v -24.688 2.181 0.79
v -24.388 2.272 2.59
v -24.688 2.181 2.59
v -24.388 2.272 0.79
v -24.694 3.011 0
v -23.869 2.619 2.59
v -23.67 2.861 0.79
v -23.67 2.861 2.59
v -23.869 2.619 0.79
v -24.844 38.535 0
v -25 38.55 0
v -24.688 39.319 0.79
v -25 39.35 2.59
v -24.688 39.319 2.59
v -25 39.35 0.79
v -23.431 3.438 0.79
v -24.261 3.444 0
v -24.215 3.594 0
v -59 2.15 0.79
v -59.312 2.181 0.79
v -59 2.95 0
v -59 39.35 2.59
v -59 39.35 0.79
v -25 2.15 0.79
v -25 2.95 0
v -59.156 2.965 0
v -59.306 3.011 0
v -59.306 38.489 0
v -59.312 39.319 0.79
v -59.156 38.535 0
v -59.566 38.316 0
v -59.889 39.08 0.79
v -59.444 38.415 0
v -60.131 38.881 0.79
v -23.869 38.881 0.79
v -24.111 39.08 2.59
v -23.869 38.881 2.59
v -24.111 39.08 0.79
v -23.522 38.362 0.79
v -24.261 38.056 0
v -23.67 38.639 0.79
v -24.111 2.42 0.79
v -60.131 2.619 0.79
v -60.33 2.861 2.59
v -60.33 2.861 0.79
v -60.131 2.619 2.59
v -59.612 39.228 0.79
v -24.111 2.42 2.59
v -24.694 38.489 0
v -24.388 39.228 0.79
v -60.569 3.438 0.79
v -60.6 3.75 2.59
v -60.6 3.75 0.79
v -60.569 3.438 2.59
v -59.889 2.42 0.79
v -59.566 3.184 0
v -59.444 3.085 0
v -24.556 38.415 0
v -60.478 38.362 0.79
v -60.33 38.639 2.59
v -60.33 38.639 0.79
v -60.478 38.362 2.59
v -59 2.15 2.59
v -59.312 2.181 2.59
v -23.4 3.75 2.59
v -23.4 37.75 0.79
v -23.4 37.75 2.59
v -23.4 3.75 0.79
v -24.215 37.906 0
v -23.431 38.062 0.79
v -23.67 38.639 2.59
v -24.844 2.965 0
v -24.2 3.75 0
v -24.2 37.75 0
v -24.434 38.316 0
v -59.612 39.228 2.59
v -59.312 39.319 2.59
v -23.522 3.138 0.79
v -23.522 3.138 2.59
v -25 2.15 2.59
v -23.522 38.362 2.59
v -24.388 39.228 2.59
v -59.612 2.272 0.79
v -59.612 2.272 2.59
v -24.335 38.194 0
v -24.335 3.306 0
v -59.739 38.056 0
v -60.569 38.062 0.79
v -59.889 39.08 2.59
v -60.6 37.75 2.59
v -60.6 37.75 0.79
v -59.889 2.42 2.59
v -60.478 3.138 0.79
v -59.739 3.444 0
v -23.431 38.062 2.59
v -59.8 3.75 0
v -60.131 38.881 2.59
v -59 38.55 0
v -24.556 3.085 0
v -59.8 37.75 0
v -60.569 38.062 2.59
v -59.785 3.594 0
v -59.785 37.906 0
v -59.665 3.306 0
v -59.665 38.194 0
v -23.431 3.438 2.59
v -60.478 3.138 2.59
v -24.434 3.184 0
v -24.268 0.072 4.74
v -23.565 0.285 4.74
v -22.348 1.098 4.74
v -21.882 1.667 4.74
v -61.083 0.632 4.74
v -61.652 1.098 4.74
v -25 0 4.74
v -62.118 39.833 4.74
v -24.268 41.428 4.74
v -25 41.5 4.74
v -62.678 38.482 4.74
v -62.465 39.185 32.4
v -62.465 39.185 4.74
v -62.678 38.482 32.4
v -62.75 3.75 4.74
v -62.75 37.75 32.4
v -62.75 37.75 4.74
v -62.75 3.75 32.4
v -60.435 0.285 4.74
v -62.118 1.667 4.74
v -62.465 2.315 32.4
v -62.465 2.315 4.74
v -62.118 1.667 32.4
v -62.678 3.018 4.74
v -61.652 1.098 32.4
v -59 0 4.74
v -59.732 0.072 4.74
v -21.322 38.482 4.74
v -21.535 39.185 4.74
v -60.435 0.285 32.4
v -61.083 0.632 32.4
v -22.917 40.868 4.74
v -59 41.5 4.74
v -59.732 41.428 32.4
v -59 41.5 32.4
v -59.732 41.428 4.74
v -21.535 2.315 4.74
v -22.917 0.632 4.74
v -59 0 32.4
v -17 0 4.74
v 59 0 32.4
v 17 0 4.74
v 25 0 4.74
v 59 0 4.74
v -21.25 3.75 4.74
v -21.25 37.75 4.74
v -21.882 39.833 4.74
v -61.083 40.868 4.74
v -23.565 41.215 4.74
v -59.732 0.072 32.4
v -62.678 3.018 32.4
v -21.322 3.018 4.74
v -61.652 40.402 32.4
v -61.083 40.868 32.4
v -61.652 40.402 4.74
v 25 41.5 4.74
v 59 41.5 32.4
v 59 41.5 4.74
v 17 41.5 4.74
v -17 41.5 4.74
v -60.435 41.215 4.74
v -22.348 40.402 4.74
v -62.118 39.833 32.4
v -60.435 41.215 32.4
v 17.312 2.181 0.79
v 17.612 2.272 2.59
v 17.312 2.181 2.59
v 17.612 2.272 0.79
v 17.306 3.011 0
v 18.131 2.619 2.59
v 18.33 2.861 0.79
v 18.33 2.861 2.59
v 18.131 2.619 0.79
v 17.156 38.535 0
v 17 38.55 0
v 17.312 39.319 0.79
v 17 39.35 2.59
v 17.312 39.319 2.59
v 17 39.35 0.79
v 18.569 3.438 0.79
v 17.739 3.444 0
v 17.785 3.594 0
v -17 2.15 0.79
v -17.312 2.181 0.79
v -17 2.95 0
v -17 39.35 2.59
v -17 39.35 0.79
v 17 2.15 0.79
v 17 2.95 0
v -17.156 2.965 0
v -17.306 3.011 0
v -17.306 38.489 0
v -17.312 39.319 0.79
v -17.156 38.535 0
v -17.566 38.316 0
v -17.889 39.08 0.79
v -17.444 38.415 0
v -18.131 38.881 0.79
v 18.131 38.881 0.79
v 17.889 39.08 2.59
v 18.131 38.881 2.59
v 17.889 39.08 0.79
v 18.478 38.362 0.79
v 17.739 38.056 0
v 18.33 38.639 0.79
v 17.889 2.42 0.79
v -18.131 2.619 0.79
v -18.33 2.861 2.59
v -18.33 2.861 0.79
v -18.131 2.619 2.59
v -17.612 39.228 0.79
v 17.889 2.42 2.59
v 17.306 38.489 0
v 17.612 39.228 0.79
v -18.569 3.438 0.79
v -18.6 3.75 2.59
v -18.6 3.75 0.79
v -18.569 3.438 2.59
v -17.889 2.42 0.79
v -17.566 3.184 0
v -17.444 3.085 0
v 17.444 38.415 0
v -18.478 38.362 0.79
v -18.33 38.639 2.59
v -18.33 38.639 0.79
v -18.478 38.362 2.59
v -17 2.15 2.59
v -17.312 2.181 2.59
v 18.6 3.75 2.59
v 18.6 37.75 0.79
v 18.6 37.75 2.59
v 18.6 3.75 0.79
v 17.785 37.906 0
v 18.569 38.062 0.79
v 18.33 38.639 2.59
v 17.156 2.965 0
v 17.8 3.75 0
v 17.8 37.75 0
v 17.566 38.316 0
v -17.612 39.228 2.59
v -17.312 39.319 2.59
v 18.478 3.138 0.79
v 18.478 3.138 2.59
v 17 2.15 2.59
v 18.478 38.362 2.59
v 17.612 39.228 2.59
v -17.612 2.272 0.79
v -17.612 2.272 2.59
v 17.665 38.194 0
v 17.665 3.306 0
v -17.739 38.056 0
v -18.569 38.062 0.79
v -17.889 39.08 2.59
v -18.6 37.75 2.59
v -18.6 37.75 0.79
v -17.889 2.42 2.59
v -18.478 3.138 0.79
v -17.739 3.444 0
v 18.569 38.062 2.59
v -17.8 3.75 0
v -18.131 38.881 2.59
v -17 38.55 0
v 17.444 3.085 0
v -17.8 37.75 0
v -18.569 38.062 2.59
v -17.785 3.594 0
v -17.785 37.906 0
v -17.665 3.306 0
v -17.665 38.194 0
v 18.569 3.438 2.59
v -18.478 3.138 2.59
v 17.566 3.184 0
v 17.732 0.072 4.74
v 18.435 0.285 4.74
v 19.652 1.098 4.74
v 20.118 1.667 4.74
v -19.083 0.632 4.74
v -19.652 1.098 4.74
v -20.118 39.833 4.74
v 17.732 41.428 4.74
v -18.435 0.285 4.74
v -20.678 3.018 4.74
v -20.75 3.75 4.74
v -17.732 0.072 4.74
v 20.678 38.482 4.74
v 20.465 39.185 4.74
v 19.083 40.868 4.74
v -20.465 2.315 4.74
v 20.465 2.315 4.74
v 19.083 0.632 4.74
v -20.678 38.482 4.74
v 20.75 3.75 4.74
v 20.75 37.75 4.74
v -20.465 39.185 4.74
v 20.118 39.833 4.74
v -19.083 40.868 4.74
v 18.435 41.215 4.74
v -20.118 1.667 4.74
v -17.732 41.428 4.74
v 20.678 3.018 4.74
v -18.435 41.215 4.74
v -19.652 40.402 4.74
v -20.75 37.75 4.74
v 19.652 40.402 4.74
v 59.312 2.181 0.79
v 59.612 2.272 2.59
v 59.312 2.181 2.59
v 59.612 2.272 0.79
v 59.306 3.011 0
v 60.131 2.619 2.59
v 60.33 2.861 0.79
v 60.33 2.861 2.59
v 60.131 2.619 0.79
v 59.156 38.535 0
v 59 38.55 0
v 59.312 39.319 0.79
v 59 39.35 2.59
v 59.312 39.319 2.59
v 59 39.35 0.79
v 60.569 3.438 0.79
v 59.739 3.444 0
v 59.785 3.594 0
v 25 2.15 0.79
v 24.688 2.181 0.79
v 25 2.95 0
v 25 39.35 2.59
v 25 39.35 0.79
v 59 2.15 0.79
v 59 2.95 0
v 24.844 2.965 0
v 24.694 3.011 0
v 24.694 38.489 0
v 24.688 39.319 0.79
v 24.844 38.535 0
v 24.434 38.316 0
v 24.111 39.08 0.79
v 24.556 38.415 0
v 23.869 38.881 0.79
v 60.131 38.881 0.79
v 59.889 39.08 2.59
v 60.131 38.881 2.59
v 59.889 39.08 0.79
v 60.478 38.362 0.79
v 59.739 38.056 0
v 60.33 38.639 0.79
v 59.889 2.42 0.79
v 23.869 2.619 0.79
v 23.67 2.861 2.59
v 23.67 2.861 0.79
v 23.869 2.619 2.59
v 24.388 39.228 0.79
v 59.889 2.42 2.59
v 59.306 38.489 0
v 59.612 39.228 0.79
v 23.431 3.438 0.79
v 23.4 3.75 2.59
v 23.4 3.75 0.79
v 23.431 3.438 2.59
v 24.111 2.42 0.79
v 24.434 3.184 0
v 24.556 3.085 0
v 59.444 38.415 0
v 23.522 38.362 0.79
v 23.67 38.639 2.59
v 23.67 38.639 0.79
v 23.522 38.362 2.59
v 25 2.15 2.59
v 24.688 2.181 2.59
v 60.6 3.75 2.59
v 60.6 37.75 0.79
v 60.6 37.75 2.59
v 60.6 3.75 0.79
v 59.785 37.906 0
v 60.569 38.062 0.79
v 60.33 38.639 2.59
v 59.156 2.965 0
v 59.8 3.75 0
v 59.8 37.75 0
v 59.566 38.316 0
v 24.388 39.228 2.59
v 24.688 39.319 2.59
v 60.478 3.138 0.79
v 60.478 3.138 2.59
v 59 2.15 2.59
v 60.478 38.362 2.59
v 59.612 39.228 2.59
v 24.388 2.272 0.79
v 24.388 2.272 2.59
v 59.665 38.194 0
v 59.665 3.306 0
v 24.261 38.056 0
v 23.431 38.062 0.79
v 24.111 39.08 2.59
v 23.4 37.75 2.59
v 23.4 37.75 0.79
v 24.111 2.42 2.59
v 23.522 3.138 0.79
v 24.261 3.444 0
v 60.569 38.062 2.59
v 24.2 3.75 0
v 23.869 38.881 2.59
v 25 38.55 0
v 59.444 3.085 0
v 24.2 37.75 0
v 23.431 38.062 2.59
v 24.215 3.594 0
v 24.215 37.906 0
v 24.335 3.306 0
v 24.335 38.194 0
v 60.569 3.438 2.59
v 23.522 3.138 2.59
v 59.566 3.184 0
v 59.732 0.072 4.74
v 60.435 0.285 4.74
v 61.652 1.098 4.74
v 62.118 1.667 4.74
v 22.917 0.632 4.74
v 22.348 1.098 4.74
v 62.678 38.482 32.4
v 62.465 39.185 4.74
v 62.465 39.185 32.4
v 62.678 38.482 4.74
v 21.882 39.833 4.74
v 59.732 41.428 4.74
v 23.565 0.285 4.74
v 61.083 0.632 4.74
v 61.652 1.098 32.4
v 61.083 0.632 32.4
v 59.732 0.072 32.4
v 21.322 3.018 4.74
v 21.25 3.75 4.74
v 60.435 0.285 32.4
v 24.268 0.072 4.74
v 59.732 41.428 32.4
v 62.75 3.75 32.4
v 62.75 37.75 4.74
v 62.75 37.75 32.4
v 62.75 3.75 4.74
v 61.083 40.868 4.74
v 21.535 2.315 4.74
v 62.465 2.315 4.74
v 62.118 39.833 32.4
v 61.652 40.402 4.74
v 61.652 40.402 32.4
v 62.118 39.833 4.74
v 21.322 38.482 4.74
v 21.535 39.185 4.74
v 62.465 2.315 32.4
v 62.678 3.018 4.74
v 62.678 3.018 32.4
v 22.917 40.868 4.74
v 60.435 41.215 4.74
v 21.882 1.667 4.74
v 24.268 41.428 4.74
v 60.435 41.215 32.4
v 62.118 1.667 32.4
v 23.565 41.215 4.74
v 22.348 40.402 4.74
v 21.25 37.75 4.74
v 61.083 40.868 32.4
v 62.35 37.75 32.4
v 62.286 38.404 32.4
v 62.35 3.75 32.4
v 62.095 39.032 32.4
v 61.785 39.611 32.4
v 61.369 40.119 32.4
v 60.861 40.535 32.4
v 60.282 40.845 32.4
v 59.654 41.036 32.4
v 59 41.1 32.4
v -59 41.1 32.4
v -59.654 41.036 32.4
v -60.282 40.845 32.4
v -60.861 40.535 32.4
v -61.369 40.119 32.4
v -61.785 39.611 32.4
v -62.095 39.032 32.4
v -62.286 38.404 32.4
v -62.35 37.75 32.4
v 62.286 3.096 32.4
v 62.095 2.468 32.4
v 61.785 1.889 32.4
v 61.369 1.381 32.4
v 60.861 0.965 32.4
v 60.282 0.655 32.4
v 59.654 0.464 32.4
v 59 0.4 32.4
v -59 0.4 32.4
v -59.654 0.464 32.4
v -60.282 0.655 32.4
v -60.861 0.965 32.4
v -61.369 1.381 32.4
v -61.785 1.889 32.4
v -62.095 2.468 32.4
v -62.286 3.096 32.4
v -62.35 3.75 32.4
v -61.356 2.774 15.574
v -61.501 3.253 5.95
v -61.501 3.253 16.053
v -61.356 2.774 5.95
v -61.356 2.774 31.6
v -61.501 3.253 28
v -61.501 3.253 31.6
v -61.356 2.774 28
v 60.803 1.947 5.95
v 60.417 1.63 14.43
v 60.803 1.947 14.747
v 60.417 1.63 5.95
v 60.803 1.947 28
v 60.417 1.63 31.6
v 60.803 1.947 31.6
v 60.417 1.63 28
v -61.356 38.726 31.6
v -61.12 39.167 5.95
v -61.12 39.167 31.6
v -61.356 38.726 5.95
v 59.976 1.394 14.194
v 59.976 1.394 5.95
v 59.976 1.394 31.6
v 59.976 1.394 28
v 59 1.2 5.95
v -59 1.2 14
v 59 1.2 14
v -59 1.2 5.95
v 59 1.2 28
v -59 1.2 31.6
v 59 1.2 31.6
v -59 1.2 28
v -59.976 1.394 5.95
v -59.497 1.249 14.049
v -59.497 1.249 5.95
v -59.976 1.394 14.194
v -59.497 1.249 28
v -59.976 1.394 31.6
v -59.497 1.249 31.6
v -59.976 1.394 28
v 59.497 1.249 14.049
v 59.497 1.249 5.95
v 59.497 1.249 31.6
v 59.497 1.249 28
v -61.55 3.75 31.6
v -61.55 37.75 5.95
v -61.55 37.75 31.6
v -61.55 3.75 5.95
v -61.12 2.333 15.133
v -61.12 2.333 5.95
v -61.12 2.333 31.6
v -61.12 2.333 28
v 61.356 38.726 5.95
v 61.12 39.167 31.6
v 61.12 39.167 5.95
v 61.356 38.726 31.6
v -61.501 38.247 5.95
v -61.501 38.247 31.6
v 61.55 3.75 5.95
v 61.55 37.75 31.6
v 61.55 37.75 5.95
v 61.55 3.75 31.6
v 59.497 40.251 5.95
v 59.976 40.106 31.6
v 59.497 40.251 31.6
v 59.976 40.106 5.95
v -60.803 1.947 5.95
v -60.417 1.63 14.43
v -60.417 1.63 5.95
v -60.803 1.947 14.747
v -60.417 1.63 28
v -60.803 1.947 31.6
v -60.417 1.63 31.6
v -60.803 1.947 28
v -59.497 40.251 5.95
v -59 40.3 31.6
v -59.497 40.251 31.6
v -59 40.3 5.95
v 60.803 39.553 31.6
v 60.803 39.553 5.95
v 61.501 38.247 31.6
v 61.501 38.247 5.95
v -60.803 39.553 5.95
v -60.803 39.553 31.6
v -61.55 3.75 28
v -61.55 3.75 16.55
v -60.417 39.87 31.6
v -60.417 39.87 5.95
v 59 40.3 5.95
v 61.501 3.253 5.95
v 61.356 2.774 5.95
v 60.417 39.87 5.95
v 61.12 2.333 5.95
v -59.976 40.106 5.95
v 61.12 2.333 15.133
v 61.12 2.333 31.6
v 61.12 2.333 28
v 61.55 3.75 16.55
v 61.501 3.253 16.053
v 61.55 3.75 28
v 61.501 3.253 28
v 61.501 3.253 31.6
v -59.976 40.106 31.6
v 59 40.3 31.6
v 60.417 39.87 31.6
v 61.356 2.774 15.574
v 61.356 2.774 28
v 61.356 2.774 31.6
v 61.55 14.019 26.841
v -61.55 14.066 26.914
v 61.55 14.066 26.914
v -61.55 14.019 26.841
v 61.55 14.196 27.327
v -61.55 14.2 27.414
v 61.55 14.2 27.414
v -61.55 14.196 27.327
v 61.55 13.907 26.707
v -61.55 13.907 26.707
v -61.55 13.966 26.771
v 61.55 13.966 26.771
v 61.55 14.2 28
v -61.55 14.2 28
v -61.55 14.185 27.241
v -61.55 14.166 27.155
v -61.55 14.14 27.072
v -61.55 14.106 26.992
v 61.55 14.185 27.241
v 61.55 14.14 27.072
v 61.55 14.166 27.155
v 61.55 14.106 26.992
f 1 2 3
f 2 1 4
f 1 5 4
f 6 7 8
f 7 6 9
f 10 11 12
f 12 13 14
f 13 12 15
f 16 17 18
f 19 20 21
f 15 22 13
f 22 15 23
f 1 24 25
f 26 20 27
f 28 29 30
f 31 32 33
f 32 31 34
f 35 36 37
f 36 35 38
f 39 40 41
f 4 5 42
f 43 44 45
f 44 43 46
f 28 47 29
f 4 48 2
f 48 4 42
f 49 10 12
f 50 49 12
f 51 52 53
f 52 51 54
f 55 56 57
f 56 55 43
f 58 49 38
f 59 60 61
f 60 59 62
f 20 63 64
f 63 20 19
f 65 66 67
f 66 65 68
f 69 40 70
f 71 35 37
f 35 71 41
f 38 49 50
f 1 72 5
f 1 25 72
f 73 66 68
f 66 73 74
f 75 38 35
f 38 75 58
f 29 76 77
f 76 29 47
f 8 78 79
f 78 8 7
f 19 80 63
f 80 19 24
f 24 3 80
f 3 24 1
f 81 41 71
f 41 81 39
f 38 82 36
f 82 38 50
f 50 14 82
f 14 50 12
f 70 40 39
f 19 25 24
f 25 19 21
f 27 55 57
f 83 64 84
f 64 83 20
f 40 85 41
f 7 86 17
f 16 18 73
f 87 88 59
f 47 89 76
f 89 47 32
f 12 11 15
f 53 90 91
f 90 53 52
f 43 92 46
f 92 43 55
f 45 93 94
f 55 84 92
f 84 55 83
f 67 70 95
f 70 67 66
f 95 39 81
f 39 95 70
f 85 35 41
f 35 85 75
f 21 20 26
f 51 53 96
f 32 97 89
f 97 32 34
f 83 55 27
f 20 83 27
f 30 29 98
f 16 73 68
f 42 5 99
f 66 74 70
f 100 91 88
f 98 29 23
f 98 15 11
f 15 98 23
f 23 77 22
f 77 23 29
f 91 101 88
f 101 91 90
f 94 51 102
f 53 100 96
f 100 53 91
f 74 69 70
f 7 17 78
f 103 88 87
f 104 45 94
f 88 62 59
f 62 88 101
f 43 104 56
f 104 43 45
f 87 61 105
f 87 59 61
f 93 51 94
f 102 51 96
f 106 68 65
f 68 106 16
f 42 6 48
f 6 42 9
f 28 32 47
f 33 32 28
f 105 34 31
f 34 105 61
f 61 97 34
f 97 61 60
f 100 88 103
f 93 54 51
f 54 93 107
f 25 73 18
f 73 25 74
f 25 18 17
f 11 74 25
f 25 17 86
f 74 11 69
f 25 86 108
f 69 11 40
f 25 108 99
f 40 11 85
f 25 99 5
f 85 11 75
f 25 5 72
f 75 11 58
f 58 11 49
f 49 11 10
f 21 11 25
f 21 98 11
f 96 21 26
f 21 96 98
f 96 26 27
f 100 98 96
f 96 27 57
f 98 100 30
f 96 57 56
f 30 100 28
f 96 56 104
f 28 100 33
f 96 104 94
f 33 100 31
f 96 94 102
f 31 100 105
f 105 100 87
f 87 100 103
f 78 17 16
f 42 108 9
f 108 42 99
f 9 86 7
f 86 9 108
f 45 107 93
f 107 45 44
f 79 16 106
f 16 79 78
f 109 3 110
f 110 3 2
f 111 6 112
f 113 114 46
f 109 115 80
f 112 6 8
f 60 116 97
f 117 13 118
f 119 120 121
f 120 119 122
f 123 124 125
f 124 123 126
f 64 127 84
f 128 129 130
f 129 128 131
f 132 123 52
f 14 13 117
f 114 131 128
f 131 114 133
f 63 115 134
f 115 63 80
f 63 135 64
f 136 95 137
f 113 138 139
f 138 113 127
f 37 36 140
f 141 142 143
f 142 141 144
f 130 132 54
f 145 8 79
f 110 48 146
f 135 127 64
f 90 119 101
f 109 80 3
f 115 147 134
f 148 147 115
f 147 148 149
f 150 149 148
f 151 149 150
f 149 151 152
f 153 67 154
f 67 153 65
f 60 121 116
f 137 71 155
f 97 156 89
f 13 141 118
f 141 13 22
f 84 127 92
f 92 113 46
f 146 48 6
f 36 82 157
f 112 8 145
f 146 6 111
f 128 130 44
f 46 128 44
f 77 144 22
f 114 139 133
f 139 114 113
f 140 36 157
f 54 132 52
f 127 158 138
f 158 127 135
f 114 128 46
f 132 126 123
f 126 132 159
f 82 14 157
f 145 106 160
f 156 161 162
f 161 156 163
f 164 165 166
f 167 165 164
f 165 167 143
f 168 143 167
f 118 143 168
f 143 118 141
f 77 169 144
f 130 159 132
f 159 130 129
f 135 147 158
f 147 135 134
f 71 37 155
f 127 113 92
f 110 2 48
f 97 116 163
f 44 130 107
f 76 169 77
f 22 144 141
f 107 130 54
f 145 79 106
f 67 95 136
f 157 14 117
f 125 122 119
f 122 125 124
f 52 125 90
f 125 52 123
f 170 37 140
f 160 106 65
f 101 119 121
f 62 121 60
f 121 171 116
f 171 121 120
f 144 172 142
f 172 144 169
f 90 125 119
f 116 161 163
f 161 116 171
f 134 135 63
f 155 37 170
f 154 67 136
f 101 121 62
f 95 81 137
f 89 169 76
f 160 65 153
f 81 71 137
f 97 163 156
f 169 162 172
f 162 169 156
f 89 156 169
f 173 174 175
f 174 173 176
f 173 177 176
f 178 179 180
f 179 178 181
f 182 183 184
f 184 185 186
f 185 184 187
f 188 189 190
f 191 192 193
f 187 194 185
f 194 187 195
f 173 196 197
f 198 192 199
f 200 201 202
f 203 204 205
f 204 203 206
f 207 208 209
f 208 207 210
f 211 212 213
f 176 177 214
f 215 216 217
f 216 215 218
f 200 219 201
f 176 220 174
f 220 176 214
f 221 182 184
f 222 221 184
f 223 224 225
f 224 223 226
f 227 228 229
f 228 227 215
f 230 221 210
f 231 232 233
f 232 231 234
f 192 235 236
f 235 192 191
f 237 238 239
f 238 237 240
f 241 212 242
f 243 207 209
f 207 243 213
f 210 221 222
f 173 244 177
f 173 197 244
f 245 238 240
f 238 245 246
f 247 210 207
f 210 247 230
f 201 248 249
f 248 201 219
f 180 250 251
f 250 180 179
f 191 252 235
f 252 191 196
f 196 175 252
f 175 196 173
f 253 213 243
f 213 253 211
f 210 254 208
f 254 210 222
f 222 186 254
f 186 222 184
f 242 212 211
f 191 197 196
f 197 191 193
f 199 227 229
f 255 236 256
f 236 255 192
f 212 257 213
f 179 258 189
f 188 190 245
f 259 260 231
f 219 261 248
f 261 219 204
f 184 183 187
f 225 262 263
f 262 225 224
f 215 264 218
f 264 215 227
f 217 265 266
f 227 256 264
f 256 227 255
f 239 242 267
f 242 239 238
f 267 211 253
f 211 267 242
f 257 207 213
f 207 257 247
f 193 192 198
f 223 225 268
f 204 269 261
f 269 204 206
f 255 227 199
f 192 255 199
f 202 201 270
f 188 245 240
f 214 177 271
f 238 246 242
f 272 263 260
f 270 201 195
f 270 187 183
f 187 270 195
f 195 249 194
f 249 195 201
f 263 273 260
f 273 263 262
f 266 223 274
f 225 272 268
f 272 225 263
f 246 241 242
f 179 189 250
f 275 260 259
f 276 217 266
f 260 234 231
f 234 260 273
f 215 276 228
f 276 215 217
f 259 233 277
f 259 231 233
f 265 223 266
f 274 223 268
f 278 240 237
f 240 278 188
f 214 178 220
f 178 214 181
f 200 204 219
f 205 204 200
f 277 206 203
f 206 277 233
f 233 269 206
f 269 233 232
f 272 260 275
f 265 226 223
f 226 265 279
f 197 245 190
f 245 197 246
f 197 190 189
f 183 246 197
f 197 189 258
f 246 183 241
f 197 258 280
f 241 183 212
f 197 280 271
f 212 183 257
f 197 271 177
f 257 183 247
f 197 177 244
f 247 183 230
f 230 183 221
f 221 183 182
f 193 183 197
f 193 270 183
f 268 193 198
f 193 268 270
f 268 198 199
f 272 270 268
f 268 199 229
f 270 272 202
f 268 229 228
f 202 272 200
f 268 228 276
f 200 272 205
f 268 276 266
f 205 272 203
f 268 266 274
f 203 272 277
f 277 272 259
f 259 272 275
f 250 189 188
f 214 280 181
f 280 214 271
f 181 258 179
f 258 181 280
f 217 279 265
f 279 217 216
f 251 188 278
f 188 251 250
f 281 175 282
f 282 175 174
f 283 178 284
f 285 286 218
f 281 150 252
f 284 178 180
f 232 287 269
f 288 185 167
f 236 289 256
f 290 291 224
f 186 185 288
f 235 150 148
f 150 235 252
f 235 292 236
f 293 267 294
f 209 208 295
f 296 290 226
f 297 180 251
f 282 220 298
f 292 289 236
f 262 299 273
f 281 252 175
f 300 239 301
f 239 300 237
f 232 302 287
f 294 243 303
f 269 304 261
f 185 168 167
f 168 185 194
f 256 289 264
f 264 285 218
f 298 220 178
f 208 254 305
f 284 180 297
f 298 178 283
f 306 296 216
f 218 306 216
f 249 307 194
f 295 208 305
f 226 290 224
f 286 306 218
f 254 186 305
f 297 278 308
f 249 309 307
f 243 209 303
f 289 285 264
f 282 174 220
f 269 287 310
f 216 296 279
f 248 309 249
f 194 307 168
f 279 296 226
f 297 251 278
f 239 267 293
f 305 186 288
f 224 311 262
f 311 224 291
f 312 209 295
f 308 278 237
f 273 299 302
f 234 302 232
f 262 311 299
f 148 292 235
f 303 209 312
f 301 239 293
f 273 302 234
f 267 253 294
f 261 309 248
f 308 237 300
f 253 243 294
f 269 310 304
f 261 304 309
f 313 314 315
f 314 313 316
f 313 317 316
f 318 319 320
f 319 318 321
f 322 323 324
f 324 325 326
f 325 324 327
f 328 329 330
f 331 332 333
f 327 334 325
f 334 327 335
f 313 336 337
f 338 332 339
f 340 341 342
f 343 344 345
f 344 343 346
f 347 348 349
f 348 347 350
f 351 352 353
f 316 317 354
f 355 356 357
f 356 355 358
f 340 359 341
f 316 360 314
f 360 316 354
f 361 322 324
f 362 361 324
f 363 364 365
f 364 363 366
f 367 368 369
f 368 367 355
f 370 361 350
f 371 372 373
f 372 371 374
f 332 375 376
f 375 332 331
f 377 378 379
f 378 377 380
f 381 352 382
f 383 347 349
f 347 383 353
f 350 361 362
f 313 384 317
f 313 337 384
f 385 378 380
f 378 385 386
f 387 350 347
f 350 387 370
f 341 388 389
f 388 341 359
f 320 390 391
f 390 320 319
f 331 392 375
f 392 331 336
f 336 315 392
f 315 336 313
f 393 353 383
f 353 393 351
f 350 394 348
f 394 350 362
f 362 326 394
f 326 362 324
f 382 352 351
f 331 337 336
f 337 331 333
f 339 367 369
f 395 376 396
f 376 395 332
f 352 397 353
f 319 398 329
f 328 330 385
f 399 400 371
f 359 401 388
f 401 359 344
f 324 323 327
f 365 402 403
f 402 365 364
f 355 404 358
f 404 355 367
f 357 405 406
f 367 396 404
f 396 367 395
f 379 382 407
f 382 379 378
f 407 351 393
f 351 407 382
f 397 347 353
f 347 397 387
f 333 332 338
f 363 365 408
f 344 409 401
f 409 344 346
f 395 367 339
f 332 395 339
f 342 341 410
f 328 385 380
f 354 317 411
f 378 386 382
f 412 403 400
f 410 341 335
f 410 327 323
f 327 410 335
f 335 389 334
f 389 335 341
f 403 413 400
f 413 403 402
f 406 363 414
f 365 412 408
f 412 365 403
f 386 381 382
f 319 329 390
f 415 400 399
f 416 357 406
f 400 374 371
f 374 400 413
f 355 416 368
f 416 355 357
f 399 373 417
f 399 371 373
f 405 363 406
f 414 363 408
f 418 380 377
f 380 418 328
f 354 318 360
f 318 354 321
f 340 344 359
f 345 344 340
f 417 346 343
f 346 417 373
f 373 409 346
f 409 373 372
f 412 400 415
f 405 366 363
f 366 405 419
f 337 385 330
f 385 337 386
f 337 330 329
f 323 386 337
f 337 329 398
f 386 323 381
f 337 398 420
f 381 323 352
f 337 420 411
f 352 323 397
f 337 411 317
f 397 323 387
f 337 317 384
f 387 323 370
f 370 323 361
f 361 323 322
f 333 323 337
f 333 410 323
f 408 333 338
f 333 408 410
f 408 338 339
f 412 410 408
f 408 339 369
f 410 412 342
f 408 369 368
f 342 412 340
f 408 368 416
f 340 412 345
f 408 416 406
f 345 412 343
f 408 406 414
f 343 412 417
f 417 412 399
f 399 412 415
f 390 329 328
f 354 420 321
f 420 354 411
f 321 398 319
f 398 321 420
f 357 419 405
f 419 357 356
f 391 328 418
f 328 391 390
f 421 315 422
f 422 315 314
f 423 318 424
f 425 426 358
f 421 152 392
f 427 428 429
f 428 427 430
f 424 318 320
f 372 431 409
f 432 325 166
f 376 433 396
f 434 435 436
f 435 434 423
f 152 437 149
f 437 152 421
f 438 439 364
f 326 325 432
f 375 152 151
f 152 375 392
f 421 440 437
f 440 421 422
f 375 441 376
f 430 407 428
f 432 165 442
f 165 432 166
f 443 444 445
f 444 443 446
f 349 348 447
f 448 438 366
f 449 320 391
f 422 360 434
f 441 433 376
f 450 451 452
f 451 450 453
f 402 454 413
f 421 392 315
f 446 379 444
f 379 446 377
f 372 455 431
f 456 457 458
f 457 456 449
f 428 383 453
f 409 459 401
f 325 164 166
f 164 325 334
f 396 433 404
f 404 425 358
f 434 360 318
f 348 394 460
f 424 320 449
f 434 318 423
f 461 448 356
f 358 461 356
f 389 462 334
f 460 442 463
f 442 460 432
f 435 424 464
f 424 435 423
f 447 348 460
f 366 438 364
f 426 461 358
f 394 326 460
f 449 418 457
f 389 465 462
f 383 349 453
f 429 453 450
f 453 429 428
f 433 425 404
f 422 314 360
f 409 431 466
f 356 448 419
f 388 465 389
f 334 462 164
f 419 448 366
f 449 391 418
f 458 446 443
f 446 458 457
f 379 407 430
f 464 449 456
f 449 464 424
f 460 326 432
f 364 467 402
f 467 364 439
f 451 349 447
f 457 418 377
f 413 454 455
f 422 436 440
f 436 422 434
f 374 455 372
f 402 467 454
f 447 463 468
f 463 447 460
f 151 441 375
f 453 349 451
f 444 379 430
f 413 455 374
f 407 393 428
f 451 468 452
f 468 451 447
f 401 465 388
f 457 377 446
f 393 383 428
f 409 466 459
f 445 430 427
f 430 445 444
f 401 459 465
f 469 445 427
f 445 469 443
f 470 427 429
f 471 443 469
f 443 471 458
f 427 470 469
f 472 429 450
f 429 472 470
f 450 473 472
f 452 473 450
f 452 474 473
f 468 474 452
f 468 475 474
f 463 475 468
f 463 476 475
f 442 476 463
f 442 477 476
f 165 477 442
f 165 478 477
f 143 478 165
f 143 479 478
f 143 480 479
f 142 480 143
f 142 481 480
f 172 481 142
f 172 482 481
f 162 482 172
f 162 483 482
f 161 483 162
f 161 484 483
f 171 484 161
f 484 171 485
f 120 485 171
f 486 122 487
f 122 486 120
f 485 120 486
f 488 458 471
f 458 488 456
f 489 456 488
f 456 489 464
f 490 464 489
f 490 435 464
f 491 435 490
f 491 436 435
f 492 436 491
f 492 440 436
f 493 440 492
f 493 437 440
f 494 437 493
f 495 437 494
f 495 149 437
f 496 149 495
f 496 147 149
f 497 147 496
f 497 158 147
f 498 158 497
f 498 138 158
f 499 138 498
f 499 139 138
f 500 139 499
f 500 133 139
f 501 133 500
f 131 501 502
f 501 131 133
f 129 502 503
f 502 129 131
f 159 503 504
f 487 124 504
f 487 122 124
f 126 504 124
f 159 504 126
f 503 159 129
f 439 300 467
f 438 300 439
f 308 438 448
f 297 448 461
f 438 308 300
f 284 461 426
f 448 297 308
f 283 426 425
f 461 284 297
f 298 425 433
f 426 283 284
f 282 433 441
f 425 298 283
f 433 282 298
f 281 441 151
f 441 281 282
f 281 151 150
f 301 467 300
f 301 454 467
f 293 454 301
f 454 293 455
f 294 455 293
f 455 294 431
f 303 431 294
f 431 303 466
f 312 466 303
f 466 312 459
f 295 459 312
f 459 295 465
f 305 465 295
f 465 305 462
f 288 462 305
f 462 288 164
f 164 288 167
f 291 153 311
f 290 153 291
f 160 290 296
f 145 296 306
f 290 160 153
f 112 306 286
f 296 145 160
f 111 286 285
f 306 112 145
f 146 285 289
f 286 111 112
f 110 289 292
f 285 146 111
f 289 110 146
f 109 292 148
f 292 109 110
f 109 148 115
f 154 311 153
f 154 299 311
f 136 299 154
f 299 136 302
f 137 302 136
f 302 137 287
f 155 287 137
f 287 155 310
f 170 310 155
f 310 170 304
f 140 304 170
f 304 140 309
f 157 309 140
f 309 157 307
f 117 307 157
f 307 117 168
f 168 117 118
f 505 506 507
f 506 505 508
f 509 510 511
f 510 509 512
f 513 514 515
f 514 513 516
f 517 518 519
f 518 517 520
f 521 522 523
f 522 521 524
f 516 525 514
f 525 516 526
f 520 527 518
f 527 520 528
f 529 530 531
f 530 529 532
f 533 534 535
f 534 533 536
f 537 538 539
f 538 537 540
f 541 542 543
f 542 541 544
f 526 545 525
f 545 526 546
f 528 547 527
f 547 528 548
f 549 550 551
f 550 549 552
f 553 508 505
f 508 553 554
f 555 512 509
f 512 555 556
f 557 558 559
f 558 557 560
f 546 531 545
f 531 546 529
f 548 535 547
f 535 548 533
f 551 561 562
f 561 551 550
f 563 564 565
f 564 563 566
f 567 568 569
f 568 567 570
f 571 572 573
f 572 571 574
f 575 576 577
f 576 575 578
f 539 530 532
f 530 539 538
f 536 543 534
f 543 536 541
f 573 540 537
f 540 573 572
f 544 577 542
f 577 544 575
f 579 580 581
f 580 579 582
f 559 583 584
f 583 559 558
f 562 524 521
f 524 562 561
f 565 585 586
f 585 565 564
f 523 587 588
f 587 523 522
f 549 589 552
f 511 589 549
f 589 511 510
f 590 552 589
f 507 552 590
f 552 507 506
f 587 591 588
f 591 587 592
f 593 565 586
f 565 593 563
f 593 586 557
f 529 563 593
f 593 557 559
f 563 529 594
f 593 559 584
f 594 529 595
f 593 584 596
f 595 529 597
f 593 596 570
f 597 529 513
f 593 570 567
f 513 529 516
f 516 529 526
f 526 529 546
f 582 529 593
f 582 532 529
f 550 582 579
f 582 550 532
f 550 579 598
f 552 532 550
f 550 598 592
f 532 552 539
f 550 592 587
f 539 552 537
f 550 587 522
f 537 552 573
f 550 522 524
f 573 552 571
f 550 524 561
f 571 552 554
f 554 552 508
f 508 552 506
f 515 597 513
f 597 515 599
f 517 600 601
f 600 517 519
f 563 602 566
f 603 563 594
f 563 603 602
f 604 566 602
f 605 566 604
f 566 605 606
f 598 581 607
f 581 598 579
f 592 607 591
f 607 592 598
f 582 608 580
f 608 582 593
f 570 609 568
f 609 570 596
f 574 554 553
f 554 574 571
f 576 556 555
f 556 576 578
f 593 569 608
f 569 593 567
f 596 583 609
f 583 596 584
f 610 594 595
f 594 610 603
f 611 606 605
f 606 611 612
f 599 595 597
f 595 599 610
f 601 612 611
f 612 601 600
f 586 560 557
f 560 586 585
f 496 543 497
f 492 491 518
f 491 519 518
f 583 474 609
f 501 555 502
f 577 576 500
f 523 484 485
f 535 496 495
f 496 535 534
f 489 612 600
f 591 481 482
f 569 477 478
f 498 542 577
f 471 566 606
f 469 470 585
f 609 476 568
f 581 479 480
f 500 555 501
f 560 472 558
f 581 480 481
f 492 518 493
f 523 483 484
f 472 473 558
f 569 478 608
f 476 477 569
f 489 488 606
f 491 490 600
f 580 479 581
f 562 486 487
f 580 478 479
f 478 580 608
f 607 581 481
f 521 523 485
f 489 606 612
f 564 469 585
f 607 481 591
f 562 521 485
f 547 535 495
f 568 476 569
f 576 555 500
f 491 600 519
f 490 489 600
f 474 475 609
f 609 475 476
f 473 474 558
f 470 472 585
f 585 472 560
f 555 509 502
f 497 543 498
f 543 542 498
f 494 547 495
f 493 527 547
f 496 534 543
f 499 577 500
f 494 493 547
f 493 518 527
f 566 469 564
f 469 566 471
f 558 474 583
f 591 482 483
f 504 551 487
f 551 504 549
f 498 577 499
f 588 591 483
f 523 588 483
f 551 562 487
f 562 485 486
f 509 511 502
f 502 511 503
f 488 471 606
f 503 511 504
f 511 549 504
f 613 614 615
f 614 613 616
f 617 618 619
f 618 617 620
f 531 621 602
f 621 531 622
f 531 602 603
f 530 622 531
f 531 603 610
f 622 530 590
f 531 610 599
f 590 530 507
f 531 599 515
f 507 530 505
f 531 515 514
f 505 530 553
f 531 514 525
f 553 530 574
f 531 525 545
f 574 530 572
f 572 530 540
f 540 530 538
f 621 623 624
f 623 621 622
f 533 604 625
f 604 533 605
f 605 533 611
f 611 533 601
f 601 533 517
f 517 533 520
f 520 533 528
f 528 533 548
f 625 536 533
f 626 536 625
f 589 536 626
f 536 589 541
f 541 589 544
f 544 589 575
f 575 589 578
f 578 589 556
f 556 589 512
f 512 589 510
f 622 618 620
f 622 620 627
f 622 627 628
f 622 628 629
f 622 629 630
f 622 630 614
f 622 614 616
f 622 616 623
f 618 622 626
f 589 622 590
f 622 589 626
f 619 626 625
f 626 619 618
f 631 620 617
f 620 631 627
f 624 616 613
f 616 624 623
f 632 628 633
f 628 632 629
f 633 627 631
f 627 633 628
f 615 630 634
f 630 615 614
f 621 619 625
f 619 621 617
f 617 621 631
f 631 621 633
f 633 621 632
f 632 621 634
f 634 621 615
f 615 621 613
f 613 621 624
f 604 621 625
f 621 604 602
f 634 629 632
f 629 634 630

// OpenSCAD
// file: ../../modules/gridfinity.scad
// Gridfinity ベースプレートの共有 module。
// 寸法は Gridfinity 仕様 (Zack Freedman) の baseplate 輪郭に従う:
//   ピッチ 42、ソケット上端開口 41.5 (角 R4)、上から 45° 面取り 2.15 →
//   垂直 1.8 (37.2 角・R1.85) → 45° 面取り 0.7 → 底 35.8 角 (R1.15)。
//   ソケット深さ = 2.15 + 1.8 + 0.7 = 4.65。
//
// 座標系: X が列方向 (中央が 0)、Y が行方向 (板の前端が 0)、Z=0 が板の底面。
// 板の外形は grid とは独立に rim で与えるので、grid より大きい板 (縁付き) を
// 作れる。ソケットは rim=[left, right, front, back] の内側へ 42 ピッチで並ぶ。

gf_pitch = 42;
gf_socket_top = 41.5; // 上端開口
gf_socket_mid = 37.2; // 垂直部
gf_socket_bot = 35.8; // 底
gf_socket_r_top = 4;
gf_socket_r_mid = 1.85;
gf_socket_r_bot = 1.15;
gf_chamfer_top = 2.15;
gf_wall_h = 1.8;
gf_chamfer_bot = 0.7;
gf_socket_depth = gf_chamfer_top + gf_wall_h + gf_chamfer_bot; // 4.65
gf_fn = 32;
gf_eps = 0.01; // hull 用の薄板の厚さ
gf_over = 0.5; // 切削の抜き代

// 角丸正方形 (一辺 w、角 R)
module
gf_rounded_square(w, r)
{
    offset(r = r, $fn = gf_fn) square(w - 2 * r, center = true);
}

// 厚さ gf_eps の角丸正方形の薄板を z に置く (hull の骨)
module
gf_slab(w, r, z)
{
    translate([ 0, 0, z ]) linear_extrude(gf_eps) gf_rounded_square(w, r);
}

// ソケット1個の切削体。z=0 がソケットの底 (床の天面)、+Z へ 4.65 で天面に出る。
// clearance は嵌合の逃げで、輪郭を全周へ clearance だけ外へ出す (幅 +2c、角 R
// +c)。 既定 0 が Gridfinity の公称輪郭。深さとピッチは変えない
module
gf_socket_cut(clearance = 0)
{
    z1 = gf_chamfer_bot;
    z2 = z1 + gf_wall_h;
    z3 = gf_socket_depth;
    c = clearance;
    hull()
    {
        gf_slab(gf_socket_bot + 2 * c, gf_socket_r_bot + c, 0);
        gf_slab(gf_socket_mid + 2 * c, gf_socket_r_mid + c, z1 - gf_eps);
    }
    hull()
    {
        gf_slab(gf_socket_mid + 2 * c, gf_socket_r_mid + c, z1 - gf_eps);
        gf_slab(gf_socket_mid + 2 * c, gf_socket_r_mid + c, z2 - gf_eps);
    }
    hull()
    {
        gf_slab(gf_socket_mid + 2 * c, gf_socket_r_mid + c, z2 - gf_eps);
        gf_slab(gf_socket_top + 2 * c, gf_socket_r_top + c, z3 - gf_eps);
    }
    // 天面より上へ抜く (天面と同一平面の退化した面を残さない)
    gf_slab(gf_socket_top + 2 * c, gf_socket_r_top + c, z3 - gf_eps);
    translate([ 0, 0, z3 - gf_eps ]) linear_extrude(gf_over + gf_eps)
        gf_rounded_square(gf_socket_top + 2 * c, gf_socket_r_top + c);
}

// ベースプレート。cols x rows のソケットを床 floor_t の上に彫る。
// rim = [left, right, front, back] はソケット列の外側に残す縁の幅。
// 板の幅 = cols*42 + left + right、奥行き = rows*42 + front + back。
// clearance はソケットの嵌合の逃げ (gf_socket_cut を参照)。
module
gf_baseplate(cols, rows, rim = [ 0, 0, 0, 0 ], floor_t = 1, clearance = 0)
{
    grid_w = cols * gf_pitch;
    grid_d = rows * gf_pitch;
    plate_w = grid_w + rim[0] + rim[1];
    plate_d = grid_d + rim[2] + rim[3];
    x0 = -plate_w / 2 + rim[0]; // ソケット列の左端
    difference()
    {
        translate([ -plate_w / 2, 0, 0 ])
            cube([ plate_w, plate_d, floor_t + gf_socket_depth ]);
        for (c = [0:cols - 1], r = [0:rows - 1])
            translate([
                x0 + (c + 0.5) * gf_pitch,
                rim[2] + (r + 0.5) * gf_pitch,
                floor_t
            ]) gf_socket_cut(clearance);
    }
}
// file: ../../modules/gridfinity_bin.scad
include <gridfinity.scad>

// Gridfinity bin (箱) の共有 module。ピッチと角丸は gridfinity.scad
// と共有する。 底の輪郭は Gridfinity 仕様の bin base (下から):
//   35.6 角 (R0.8) → 45° 0.8 → 37.2 角 (R1.6) → 垂直 1.8 → 45° 2.15 → 41.5 角
//   (R3.75) 高さ 0.8 + 1.8 + 2.15 = 4.75。磁石穴・ネジ穴は持たない (無垢)
// 外形はピッチ − 0.5 (1 マス 41.5)、角 R3.75。高さ単位 7 (4U = 28 が壁の上端)。
// リップは「薄いリップ」: 壁 (1.2) をそのまま lip_h (4.4) 伸ばし、内側の上端を
// 45° に落とすだけ。内側に棚 (厚い肉) を持たないので、上に載せる bin は底の
// 面取りをこの 45° に座らせる。
//
// 座標系: X が列方向 (中央 0)、Y が行方向 (手前 = ラベル側が 0)、Z=0 が底面。

gfb_outer = gf_pitch - 0.5; // 41.5
gfb_outer_r = 3.75;
gfb_base_bot = 35.6;
gfb_base_bot_r = 0.8;
gfb_base_mid = 37.2;
gfb_base_mid_r = 1.6;
gfb_base_chamfer_bot = 0.8;
gfb_base_wall_h = 1.8;
gfb_base_chamfer_top = 2.15;
gfb_base_h =
    gfb_base_chamfer_bot + gfb_base_wall_h + gfb_base_chamfer_top; // 4.75
gfb_unit = 7;
gfb_lip_h = 4.4;
gfb_lip_chamfer = 0.8;

// bin 1 マスぶんの底 (無垢)。z=0 が底面、gfb_base_h で外形 41.5 角に達する
module
gfb_base_cell()
{
    z1 = gfb_base_chamfer_bot;
    z2 = z1 + gfb_base_wall_h;
    z3 = gfb_base_h;
    hull()
    {
        gf_slab(gfb_base_bot, gfb_base_bot_r, 0);
        gf_slab(gfb_base_mid, gfb_base_mid_r, z1 - gf_eps);
    }
    hull()
    {
        gf_slab(gfb_base_mid, gfb_base_mid_r, z1 - gf_eps);
        gf_slab(gfb_base_mid, gfb_base_mid_r, z2 - gf_eps);
    }
    hull()
    {
        gf_slab(gfb_base_mid, gfb_base_mid_r, z2 - gf_eps);
        gf_slab(gfb_outer, gfb_outer_r, z3 - gf_eps);
    }
}

// cols x rows の角丸矩形 (外形)
module
gfb_footprint(cols, rows, inset = 0)
{
    w = cols * gf_pitch - 0.5 - 2 * inset;
    d = rows * gf_pitch - 0.5 - 2 * inset;
    translate([ 0, d / 2 + inset ])
        gf_rounded_square_wd(w, d, gfb_outer_r - inset);
}

// 幅 w × 奥行き d の角丸矩形 (中心が原点)
module
gf_rounded_square_wd(w, d, r)
{
    offset(r = r, $fn = gf_fn) square([ w - 2 * r, d - 2 * r ], center = true);
}

// ラベル天板の Y-Z 断面 (y = 壁の内面からの距離、z = 高さ)。天板 (厚さ t) の
// 先端から 45° の斜面が壁まで下りる無垢のくさび。先端の垂直面と斜面の境目
// (135°) を半径 r で丸める: 円弧の中心は先端の角から (-r, r·tan22.5°)、接点は
// 垂直面上の角 + (0, r·tan22.5°) と斜面上の角 + 0.4142r·(-1,-1)。壁の内側へ
// 1 だけ食い込ませて胴体と溶かす
function gfb_label_profile(d, t, h, r) =
    let(y0 = d, z0 = h - t, cy = y0 - r, cz = z0 + r * tan(22.5))
        concat([ [ -1, h ], [ d, h ] ],
               [for (a = [0:-5:-45])[cy + r * cos(a), cz + r* sin(a)]],
               [[ -1, h - t - d - 1 ]]);

// bin 本体。units は高さ (U)。wall / floor_t は壁と床の厚さ。
// label_d > 0 なら手前 (y=0) の壁の上端 (z = units*7) と面一で内側へ label_d
// 張り出す厚さ label_t のラベル天板を付ける。天板の下は 45° の無垢のくさびが
// 壁まで下りる (ブリッジもリブも無い。中身はスライサのインフィル任せ)。
// 天板の先端と 45° 面の境目は半径 label_r で丸める
module
gfb_bin(cols,
        rows,
        units = 4,
        wall = 1.2,
        floor_t = 1.2,
        label_d = 0,
        label_t = 1,
        label_r = 1)
{
    h = units * gfb_unit; // 壁の上端
    top = h + gfb_lip_h;  // リップの上端
    inner_w = cols * gf_pitch - 0.5 - 2 * wall;
    floor_top = gfb_base_h + floor_t;
    union()
    {
        // 底: マスごとの無垢の base
        for (c = [0:cols - 1], r = [0:rows - 1])
            translate([
                (c - (cols - 1) / 2) * gf_pitch,
                (r + 0.5) * gf_pitch - 0.25,
                0
            ]) gfb_base_cell();
        // 胴体: base の上から top
        // まで。内側は床の上を抜く。リップの内側の上端は 45°
        difference()
        {
            translate([ 0, 0, gfb_base_h - gf_eps ])
                linear_extrude(top - gfb_base_h + gf_eps)
                    gfb_footprint(cols, rows);
            translate([ 0, 0, floor_top ])
                linear_extrude(top - floor_top + gf_over)
                    gfb_footprint(cols, rows, wall);
            // リップ内側の面取り: 上端で wall − 0.4 まで開く
            hull()
            {
                translate([ 0, 0, top - gfb_lip_chamfer ])
                    linear_extrude(gf_eps) gfb_footprint(cols, rows, wall);
                translate([ 0, 0, top ]) linear_extrude(gf_over)
                    gfb_footprint(cols, rows, wall - gfb_lip_chamfer);
            }
        }
        // ラベル天板と 45° くさび (内幅いっぱい、同じ断面)。壁へ 1 食い込ませた
        // 矩形の柱なので、角の丸み (R3.75) の外へ出ないよう外形で切り取る
        if (label_d > 0)
            intersection()
            {
                translate([ -inner_w / 2, wall, 0 ]) rotate([ 90, 0, 90 ])
                    linear_extrude(inner_w) polygon(
                        gfb_label_profile(label_d, label_t, h, label_r));
                linear_extrude(top) gfb_footprint(cols, rows);
            }
    }
}
// file: ../../modules/gridfinity_bin_4u.scad
include <gridfinity_bin.scad>

// assets/gridfinity-bin/ の bin 群の共通値と、サイズ 3 引数の払い出し口。
// 単体では何も描かない。設計の経緯と確定値は
// ledger/designs/gridfinity-bin-4u.md が正本。 保証する範囲は cols 1..5 ×
// rows 1..5 × units 4 (assets に並ぶ 25 種)。 cols が X (横)、rows が Y
// (ラベルの壁から奥へ)、units が高さ (7mm 単位)。
wall = 1.2;    // 0.4 ノズル 3 本
floor_t = 1.2; // 底 (4.75) の上に載せる床。床の天面 z = 5.95
label_d = 13;  // 12mm 幅のラベルシールを貼る天板の張り出し
label_t = 1; // 天板の厚さ (user 指定)。下は 45° の無垢のくさび
label_r = 1; // 天板の先端と 45° 面の境目の R (user 指定)

function bin_contract(cols, rows, units) = str("CONTRACT units=",
                                               units,
                                               " pitch=",
                                               gf_pitch,
                                               " outer=",
                                               gfb_outer,
                                               " h=",
                                               units* gfb_unit,
                                               " lip=",
                                               gfb_lip_h,
                                               " base=",
                                               gfb_base_bot,
                                               "/",
                                               gfb_base_mid,
                                               "/",
                                               gfb_outer,
                                               " base_h=",
                                               gfb_base_h,
                                               " wall=",
                                               wall,
                                               " floor_top=",
                                               gfb_base_h + floor_t,
                                               " label=",
                                               label_d,
                                               "x",
                                               label_t,
                                               " wedge=45 fillet=",
                                               label_r,
                                               " bin=",
                                               cols,
                                               "x",
                                               rows,
                                               " size=",
                                               cols* gf_pitch - 0.5,
                                               "x",
                                               rows* gf_pitch - 0.5);

// (cols, rows, units) でラベル付き bin を払い出す。例: gridfinity_bin(2, 4, 4)
module
gridfinity_bin(cols, rows, units = 4)
{
    echo(bin_contract(cols, rows, units));
    gfb_bin(cols, rows, units, wall, floor_t, label_d, label_t, label_r);
}
// main file
include <../../modules/gridfinity_bin_4u.scad>

// 3x1 マス、高さ 4U のラベル天板付き bin。ラベルは手前 (y=0) 側
gridfinity_bin(3, 1, 4);
